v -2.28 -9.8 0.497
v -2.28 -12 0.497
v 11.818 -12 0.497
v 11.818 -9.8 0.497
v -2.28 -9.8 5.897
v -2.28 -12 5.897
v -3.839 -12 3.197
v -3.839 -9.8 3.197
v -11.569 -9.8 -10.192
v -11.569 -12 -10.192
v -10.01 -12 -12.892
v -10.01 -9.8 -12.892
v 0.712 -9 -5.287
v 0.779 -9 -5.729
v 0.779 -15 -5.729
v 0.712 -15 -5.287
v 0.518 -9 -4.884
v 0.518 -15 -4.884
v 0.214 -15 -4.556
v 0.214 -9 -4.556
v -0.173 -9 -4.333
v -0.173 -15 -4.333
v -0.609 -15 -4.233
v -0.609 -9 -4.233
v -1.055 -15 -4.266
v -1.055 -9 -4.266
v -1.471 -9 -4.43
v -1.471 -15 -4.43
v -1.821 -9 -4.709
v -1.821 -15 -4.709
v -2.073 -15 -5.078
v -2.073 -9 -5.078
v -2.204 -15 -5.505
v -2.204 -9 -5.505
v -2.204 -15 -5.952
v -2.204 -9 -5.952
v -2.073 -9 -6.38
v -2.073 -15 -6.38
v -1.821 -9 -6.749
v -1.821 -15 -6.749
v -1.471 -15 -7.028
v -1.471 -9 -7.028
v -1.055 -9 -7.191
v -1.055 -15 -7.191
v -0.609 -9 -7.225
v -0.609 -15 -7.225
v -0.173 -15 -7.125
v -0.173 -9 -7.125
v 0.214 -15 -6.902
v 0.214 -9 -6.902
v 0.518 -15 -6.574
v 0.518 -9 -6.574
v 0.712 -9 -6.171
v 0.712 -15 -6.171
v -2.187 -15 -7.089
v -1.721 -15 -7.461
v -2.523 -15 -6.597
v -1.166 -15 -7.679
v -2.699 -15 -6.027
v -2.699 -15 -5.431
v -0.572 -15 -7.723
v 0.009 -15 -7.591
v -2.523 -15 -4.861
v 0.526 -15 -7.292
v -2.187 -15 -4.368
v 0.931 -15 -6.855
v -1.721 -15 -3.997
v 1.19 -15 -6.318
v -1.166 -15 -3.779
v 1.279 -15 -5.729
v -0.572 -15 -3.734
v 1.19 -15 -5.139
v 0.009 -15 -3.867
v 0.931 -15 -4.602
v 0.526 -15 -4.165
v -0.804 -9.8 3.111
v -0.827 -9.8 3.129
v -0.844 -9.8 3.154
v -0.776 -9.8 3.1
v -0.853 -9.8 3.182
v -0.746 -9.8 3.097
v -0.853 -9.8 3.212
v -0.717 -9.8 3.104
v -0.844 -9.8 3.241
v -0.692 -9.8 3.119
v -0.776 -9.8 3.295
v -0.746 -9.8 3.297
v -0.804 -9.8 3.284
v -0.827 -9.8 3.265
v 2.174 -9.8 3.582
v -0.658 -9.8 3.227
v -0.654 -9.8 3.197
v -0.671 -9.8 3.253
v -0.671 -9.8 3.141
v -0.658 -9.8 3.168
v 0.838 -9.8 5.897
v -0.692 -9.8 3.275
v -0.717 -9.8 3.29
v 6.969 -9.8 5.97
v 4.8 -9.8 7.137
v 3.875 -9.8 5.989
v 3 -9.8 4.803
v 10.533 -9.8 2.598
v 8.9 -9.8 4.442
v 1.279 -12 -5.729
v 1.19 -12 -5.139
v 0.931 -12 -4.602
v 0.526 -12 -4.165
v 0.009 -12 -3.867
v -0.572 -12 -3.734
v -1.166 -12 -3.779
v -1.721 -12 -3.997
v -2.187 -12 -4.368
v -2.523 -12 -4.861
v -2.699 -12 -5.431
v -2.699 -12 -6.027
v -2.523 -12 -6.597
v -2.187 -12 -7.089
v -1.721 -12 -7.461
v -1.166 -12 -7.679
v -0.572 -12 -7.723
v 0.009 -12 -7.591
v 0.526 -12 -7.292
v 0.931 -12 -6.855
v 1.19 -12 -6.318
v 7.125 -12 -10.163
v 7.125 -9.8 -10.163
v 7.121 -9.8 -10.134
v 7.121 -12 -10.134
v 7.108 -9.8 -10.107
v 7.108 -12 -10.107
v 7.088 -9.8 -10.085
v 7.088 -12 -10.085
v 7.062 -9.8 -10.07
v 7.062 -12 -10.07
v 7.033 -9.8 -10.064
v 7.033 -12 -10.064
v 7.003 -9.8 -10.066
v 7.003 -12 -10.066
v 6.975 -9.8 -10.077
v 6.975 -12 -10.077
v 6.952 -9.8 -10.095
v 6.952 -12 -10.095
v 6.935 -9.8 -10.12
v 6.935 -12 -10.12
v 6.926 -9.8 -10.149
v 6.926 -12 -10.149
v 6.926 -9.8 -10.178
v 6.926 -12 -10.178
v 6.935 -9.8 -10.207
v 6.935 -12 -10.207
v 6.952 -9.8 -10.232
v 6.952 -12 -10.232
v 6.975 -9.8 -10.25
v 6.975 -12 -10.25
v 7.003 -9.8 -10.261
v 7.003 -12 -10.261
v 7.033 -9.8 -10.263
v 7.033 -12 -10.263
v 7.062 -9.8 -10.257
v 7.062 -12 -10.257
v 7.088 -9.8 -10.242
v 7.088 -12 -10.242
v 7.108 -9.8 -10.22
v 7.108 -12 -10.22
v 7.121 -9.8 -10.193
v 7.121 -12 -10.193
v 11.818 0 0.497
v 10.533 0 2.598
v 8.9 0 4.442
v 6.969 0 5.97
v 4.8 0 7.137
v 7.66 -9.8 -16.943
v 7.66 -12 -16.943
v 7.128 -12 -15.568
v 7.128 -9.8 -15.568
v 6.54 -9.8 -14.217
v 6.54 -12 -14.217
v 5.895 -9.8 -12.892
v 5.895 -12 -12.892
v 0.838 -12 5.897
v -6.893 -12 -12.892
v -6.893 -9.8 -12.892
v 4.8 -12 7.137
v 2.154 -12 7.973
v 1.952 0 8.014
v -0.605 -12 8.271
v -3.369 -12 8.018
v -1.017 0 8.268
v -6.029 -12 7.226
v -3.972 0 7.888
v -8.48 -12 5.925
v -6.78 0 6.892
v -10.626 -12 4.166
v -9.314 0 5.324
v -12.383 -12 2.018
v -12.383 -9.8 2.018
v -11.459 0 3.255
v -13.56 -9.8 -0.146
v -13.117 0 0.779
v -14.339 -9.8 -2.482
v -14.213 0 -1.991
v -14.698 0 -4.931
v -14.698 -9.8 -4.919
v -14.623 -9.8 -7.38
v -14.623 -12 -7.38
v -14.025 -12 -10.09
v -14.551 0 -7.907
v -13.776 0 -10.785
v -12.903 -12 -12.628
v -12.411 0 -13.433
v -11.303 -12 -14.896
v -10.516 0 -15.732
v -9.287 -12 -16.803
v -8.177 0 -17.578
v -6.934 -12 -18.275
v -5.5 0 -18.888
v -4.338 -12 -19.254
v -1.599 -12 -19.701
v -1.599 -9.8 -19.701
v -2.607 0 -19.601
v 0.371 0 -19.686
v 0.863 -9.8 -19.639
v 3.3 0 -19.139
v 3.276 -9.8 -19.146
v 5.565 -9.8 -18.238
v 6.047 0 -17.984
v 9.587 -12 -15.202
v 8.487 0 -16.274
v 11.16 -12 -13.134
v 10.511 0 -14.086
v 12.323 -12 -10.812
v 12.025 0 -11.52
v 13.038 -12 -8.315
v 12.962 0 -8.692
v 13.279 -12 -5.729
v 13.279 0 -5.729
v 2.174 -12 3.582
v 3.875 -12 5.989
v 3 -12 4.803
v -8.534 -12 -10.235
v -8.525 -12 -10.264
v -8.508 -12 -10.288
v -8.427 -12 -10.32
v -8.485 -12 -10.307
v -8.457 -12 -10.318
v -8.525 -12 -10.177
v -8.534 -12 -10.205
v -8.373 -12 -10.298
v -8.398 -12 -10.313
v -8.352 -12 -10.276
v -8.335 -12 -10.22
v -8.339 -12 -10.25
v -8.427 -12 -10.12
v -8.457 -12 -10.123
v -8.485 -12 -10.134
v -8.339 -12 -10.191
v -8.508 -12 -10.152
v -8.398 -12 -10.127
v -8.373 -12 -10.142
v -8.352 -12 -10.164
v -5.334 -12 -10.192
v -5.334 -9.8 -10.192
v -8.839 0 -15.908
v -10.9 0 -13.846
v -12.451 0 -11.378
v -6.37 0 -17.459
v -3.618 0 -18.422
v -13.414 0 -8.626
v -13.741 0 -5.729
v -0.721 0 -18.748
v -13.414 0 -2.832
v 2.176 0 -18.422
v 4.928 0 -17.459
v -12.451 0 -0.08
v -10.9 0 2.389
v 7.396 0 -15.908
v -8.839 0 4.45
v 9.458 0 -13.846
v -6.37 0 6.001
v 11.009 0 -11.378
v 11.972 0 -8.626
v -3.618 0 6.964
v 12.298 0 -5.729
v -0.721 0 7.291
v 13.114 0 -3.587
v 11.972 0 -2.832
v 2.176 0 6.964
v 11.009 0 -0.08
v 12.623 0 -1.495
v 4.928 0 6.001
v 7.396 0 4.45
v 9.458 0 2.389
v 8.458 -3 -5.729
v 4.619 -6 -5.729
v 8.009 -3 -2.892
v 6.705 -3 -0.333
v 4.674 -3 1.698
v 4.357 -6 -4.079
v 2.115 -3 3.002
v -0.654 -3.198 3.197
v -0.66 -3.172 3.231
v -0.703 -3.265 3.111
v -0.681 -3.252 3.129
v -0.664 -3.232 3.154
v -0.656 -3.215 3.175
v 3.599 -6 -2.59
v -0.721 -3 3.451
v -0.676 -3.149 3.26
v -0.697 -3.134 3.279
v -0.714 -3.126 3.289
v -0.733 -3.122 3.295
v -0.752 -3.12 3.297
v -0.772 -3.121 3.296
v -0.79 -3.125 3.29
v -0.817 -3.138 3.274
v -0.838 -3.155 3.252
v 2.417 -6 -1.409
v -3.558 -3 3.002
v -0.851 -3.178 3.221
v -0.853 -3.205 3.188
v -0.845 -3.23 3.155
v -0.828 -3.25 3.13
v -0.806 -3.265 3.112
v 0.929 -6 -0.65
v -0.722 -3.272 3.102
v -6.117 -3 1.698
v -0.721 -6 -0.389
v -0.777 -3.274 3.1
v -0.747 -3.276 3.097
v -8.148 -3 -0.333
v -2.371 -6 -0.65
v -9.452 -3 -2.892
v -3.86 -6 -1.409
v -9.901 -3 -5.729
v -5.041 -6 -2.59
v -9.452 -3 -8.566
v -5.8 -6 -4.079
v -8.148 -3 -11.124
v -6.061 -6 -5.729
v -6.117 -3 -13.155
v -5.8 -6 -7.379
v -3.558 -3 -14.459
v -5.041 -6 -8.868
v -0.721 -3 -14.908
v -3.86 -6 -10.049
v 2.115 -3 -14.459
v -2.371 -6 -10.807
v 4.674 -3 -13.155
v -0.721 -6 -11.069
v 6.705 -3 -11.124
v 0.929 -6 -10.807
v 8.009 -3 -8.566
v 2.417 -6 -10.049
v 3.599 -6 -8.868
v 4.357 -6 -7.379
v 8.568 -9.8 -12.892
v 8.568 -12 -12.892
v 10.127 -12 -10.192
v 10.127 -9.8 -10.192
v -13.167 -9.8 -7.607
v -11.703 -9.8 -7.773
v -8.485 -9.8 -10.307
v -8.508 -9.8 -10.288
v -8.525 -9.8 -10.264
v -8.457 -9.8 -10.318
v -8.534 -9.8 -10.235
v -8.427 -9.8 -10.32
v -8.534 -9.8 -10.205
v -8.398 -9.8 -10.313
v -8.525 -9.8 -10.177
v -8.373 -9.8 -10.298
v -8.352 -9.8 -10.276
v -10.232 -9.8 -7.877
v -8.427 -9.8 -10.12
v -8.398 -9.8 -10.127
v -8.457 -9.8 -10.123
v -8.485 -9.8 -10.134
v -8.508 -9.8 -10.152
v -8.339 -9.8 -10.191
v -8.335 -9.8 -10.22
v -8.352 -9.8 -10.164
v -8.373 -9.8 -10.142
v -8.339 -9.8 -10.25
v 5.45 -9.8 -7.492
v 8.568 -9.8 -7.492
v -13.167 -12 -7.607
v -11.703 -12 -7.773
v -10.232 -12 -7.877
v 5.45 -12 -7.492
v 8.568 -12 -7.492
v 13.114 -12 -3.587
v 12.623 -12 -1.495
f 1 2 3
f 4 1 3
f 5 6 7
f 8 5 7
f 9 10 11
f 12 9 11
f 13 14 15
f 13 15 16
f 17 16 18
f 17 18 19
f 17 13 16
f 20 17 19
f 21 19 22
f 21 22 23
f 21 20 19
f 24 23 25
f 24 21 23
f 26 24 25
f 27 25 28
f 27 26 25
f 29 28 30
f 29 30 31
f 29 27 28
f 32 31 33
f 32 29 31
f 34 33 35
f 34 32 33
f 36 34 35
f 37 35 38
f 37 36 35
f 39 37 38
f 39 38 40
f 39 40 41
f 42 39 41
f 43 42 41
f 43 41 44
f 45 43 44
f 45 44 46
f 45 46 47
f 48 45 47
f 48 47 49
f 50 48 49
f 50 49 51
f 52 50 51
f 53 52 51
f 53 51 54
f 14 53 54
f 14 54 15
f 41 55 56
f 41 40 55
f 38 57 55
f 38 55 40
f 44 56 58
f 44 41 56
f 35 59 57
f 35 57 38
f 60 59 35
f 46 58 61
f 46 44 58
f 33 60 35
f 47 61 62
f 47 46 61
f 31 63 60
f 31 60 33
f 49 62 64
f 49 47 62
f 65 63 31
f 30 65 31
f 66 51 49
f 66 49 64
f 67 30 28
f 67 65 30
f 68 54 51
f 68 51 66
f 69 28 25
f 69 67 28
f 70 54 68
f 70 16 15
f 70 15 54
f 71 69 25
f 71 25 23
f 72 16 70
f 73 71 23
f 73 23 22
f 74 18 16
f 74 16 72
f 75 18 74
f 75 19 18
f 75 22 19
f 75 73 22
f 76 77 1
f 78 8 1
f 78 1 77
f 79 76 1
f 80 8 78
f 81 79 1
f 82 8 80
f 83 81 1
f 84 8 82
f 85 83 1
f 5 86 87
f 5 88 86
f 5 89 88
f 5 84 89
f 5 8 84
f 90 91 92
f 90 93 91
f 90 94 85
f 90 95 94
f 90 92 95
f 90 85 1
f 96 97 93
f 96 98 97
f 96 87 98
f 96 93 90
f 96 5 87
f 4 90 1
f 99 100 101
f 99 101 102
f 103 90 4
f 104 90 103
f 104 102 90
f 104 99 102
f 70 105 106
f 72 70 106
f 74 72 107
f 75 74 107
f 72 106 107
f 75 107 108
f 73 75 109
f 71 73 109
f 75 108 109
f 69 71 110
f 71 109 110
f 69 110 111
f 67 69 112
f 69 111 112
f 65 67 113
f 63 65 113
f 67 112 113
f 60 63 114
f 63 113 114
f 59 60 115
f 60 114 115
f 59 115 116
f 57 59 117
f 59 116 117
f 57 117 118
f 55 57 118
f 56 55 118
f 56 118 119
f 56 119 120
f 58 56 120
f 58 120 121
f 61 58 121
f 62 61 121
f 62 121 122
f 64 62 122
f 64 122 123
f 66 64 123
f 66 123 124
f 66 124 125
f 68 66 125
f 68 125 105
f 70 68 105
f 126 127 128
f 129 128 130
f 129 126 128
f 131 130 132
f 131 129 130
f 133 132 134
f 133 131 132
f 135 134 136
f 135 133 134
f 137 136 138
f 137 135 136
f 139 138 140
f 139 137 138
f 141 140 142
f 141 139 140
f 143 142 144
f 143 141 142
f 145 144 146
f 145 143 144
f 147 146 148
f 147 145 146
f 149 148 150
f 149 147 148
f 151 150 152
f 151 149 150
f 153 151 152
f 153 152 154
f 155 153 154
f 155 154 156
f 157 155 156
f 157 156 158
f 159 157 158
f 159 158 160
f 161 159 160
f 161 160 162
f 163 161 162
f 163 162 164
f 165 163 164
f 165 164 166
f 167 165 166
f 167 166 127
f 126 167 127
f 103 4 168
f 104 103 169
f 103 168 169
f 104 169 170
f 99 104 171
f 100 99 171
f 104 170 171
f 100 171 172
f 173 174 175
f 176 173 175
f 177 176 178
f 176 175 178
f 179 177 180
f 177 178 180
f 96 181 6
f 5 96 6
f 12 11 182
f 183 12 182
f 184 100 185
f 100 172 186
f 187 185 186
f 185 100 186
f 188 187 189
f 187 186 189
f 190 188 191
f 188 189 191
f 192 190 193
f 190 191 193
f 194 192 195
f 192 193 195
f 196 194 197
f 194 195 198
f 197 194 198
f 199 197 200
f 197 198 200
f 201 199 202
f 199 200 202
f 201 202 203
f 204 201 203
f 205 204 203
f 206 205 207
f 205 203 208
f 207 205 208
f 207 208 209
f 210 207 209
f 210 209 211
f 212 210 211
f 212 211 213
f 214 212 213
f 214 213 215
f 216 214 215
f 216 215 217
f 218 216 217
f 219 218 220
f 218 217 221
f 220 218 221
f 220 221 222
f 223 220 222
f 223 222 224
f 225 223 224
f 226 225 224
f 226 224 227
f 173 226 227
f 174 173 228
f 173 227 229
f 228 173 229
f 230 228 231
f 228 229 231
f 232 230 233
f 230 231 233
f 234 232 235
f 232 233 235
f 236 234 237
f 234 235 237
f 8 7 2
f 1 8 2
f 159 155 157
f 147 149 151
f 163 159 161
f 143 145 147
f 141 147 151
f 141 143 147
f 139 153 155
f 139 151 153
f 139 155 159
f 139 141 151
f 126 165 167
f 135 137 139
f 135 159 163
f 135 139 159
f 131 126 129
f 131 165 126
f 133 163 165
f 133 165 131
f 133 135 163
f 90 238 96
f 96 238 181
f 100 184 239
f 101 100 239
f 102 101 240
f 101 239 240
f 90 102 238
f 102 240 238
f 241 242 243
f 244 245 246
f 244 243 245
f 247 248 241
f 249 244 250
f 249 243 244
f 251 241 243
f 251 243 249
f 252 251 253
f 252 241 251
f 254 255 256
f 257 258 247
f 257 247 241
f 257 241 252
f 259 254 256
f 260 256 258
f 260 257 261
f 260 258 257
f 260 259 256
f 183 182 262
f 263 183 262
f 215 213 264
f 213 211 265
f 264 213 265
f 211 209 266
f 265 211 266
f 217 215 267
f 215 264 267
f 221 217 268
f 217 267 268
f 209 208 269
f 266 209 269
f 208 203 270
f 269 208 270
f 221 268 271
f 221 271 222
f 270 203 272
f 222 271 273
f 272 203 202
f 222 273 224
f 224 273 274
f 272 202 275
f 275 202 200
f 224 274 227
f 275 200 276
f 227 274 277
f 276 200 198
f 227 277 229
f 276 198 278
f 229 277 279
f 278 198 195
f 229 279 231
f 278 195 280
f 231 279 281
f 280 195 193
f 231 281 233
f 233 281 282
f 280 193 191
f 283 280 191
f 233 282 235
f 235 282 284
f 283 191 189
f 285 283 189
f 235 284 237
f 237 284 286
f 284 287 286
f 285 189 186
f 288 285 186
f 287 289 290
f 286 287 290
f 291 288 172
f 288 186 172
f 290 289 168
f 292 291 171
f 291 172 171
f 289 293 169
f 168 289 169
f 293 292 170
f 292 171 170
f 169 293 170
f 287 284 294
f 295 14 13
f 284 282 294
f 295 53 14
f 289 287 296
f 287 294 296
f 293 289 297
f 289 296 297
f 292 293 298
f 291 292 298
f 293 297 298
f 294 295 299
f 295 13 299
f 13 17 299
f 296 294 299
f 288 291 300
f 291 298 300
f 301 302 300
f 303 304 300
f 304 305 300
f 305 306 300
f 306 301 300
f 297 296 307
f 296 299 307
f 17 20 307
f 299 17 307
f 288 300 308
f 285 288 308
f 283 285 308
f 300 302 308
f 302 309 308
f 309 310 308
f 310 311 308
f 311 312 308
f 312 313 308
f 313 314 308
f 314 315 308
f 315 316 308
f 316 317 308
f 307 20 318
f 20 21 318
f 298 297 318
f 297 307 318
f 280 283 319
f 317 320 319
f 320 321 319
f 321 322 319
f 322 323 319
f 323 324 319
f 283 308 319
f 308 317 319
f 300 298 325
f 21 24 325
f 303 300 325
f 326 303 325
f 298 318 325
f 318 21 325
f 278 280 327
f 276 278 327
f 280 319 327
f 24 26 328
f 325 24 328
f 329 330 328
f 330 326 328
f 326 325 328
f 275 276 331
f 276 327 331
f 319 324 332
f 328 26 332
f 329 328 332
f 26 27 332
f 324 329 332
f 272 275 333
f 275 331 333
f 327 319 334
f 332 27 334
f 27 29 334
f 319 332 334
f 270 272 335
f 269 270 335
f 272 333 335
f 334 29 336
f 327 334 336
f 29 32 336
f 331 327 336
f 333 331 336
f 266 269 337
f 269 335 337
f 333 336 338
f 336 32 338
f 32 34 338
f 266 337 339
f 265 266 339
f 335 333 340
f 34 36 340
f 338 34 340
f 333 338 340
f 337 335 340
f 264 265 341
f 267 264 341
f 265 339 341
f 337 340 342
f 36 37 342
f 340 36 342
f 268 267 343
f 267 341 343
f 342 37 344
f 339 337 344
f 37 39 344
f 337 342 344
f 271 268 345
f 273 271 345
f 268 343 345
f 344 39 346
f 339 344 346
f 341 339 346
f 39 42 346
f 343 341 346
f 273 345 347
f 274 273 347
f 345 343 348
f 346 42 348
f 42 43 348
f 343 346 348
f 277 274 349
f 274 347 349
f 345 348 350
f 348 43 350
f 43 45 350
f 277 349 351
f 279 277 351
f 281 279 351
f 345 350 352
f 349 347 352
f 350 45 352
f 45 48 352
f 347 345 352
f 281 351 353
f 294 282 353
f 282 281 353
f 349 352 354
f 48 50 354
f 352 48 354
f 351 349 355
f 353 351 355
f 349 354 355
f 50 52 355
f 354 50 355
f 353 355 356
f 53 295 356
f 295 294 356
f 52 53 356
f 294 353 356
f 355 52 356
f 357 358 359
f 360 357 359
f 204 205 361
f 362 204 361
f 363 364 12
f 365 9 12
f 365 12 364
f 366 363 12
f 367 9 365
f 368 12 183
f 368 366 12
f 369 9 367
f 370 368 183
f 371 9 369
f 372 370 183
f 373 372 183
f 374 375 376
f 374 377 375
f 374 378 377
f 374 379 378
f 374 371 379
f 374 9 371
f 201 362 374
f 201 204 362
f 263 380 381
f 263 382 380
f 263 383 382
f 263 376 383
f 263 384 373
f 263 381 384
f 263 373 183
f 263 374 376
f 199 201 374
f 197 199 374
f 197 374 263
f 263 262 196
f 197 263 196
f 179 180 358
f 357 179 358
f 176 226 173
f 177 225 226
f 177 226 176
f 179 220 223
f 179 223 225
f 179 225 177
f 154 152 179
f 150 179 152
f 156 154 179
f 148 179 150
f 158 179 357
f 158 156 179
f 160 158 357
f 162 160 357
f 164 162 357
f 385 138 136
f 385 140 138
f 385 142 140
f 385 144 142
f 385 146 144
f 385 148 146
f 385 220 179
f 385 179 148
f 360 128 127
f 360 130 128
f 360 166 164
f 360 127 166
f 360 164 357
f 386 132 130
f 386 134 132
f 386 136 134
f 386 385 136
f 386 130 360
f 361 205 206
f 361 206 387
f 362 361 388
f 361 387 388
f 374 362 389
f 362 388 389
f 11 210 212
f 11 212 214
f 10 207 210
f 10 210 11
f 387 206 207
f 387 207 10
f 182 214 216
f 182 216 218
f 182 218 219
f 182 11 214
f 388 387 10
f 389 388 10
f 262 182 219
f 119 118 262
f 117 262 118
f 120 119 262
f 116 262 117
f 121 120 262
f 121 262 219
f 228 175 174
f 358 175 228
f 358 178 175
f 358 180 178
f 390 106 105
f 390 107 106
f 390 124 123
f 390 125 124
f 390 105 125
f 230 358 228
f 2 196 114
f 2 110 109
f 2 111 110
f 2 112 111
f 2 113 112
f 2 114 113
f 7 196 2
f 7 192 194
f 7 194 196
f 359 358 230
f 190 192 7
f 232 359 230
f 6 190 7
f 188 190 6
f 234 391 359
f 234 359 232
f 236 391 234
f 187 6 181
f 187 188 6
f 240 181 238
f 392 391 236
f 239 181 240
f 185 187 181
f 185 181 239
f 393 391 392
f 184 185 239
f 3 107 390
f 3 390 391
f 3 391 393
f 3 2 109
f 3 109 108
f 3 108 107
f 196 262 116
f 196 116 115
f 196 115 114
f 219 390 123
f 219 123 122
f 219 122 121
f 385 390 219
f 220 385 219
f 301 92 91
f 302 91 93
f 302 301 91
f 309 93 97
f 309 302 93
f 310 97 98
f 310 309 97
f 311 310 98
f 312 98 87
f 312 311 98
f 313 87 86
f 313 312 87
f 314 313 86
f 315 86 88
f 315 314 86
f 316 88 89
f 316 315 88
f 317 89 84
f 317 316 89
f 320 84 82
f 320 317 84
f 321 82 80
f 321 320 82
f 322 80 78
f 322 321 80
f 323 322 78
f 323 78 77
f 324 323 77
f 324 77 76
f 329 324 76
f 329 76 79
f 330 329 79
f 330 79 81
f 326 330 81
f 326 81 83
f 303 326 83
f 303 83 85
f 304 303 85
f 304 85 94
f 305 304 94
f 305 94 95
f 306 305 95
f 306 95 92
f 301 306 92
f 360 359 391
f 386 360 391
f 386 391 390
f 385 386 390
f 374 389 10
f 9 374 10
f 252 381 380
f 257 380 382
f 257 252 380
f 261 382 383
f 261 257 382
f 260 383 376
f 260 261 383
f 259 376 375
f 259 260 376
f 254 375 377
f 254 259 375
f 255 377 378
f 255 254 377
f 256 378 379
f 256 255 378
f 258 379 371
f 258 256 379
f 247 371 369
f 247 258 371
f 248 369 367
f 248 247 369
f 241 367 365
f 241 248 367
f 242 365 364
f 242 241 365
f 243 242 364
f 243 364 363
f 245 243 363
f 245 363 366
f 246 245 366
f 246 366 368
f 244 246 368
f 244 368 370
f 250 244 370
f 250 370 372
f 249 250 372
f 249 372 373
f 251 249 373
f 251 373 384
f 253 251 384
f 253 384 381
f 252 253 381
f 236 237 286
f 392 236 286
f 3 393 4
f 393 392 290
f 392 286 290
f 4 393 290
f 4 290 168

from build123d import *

# Parameters (mm, degrees)
F0_R      = 2
F0_R_2    = 0.1
F1_DEPTH  = 12
F0_R_3    = 1.5
F2_DEPTH  = 15
F4_R      = 0.1
F5_DEPTH  = 2
F6_COUNT  = 3
F5_FACE_R = 0.1
F6_FACE_R = 0.1
F7_DEPTH  = 4.2


# Not quite as in the source:
# - a fillet or chamfer that OpenCascade refuses, or shapes differently, is made with other operations: its cross-section is extruded or revolved along the edge and cut away or added


with BuildPart() as f1:
    # F0 (on Front) → F1 (new body)
    with BuildSketch(Plane.XZ):
        with BuildLine():
            ThreePointArc((4.7997142496, 7.1366126269), (-12.410762485, -13.4329699503), (13.278817402, -5.728833265))
            ThreePointArc((13.278817402, -5.728833265), (12.9087772386, -2.5313037732), (11.8182181375, 0.4971950993))
            Line((11.8182181375, 0.4971950993), (-2.2800283653, 0.4971950993))
            Line((-2.2800283653, 0.4971950993), (-3.8388741325, 3.1971951693))
            Line((-3.8388741325, 3.1971951693), (-2.2800283653, 5.8971952394))
            Line((-2.2800283653, 5.8971952394), (0.8376631692, 5.8971952394))
            Line((0.8376631692, 5.8971952394), (2.174251278, 3.5821567261))
            ThreePointArc((2.174251278, 3.5821567261), (3.4311500139, 5.4006249736), (4.7997142496, 7.1366126269))
        make_face()
        with Locations((-0.721182598, -5.728833265)):
            Circle(F0_R, mode=Mode.SUBTRACT)
        with BuildLine():
            Line((-2.2800283653, 0.4971950993), (11.8182181375, 0.4971950993))
            ThreePointArc((11.8182181375, 0.4971950993), (8.8998388381, 4.4415131659), (4.7997142496, 7.1366126269))
            ThreePointArc((4.7997142496, 7.1366126269), (3.4311500139, 5.4006249736), (2.174251278, 3.5821567261))
            Line((2.174251278, 3.5821567261), (0.8376631692, 5.8971952394))
            Line((0.8376631692, 5.8971952394), (-2.2800283653, 5.8971952394))
            Line((-2.2800283653, 5.8971952394), (-3.8388741325, 3.1971951693))
            Line((-3.8388741325, 3.1971951693), (-2.2800283653, 0.4971950993))
        make_face()
        with Locations((-0.7538866513, 3.197135257)):
            Circle(F0_R_2, mode=Mode.SUBTRACT)
    extrude(amount=F1_DEPTH)

    # F0 (on Front) → F2 (join)
    with BuildSketch(Plane.XZ):
        with Locations((-0.721182598, -5.728833265)):
            Circle(F0_R)
        with Locations((-0.721182598, -5.728833265)):
            Circle(F0_R_3, mode=Mode.SUBTRACT)
    extrude(amount=F2_DEPTH)

    # F3: chamfer of 9 x 11.5194746897 on 1 edges, made by hand

    # F3_s1 → F3_t2 (revolve, cut)
    with BuildSketch(Plane.XY.offset(-5.728833265)):
        Polygon((12.2982920917, 0), (0.778817402, -9), (0.778817402, 0), align=None)
    revolve(axis=Axis((-0.721182598, 0, -5.728833265), (0, -1, 0)), mode=Mode.SUBTRACT)

    # F6: F5 ×3 about axis
    f6_axis = Axis((-0.721182598, 0, -5.728833265), (0, -1, 0))


with BuildPart() as f5:
    # F4 (on face) → F5 (new body)
    with BuildSketch(Plane.XZ.offset(12)):
        with BuildLine():
            Line((-2.2800283653, 0.4971950993), (11.8182181375, 0.4971950993))
            ThreePointArc((11.8182181375, 0.4971950993), (8.8998388381, 4.4415131659), (4.7997142496, 7.1366126269))
            ThreePointArc((4.7997142496, 7.1366126269), (3.4311500139, 5.4006249736), (2.174251278, 3.5821567261))
            Line((2.174251278, 3.5821567261), (0.8376631692, 5.8971952394))
            Line((0.8376631692, 5.8971952394), (-2.2800283653, 5.8971952394))
            Line((-2.2800283653, 5.8971952394), (-3.8388741325, 3.1971951693))
            Line((-3.8388741325, 3.1971951693), (-2.2800283653, 0.4971950993))
        make_face()
        with Locations((-0.7538866513, 3.197135257)):
            Circle(F4_R, mode=Mode.SUBTRACT)
    extrude(amount=F5_DEPTH)


with BuildPart() as f1_1:
    add(f1.part)
    for i in range(1, F6_COUNT):
        add(f5.part.rotate(f6_axis, i * 360 / F6_COUNT))


with BuildPart() as f7_tool:
    # F5_face (on face) + F6_face (on face) → F7 (new body)
    with BuildSketch(Plane(origin=(3.5829132763, -14, 3.0354703716), x_dir=(1, 0, 0), z_dir=(0, -1, 0))):
        with BuildLine():
            Line((-5.8629416416, 2.8617248677), (-7.4217874088, 0.1617247977))
            Line((-7.4217874088, 0.1617247977), (-5.8629416416, -2.5382752723))
            Line((-5.8629416416, -2.5382752723), (8.2353048612, -2.5382752723))
            ThreePointArc((8.2353048612, -2.5382752723), (5.3169255618, 1.4060427943), (1.2168009733, 4.1011422553))
            ThreePointArc((1.2168009733, 4.1011422553), (-0.1517632624, 2.365154602), (-1.4086619983, 0.5466863545))
            Line((-1.4086619983, 0.5466863545), (-2.7452501071, 2.8617248677))
            Line((-2.7452501071, 2.8617248677), (-5.8629416416, 2.8617248677))
        make_face()
        with Locations((-4.3367999276, 0.1616648853)):
            Circle(F5_FACE_R, mode=Mode.SUBTRACT)
    with BuildSketch(Plane(origin=(4.7168790606, -14, -13.8384414508), x_dir=(1, 0, 0), z_dir=(0, -1, 0))):
        with BuildLine():
            Line((5.4097972549, 3.6465939687), (3.8509514876, 6.3465940387))
            Line((3.8509514876, 6.3465940387), (0.7332599531, 6.3465940387))
            Line((0.7332599531, 6.3465940387), (-6.3158632983, -5.8628455816))
            ThreePointArc((-6.3158632983, -5.8628455816), (-1.4407940022, -5.3076140037), (2.943292891, -3.1043516819))
            ThreePointArc((2.943292891, -3.1043516819), (2.1241656004, -1.0511464604), (1.17777527, 0.9465938986))
            Line((1.17777527, 0.9465938986), (3.8509514876, 0.9465938986))
            Line((3.8509514876, 0.9465938986), (5.4097972549, 3.6465939687))
        make_face()
        with Locations((2.3084058614, 3.6749464658)):
            Circle(F6_FACE_R, mode=Mode.SUBTRACT)
        with BuildLine():
            Line((-14.7270748049, 0.9465938986), (-11.6093832704, 0.9465938986))
            Line((-11.6093832704, 0.9465938986), (-10.0505375032, 3.6465939687))
            Line((-10.0505375032, 3.6465939687), (-17.0996607546, 15.8560335889))
            ThreePointArc((-17.0996607546, 15.8560335889), (-19.0563507512, 11.3564839444), (-19.3403130559, 6.4581221616))
            ThreePointArc((-19.3403130559, 6.4581221616), (-17.1526215296, 6.1409045934), (-14.9493324633, 5.9616324819))
            Line((-14.9493324633, 5.9616324819), (-16.2859205721, 3.6465939687))
            Line((-16.2859205721, 3.6465939687), (-14.7270748049, 0.9465938986))
        make_face()
        with Locations((-13.1518251254, 3.6183013839)):
            Circle(F6_FACE_R, mode=Mode.SUBTRACT)
    extrude(amount=-F7_DEPTH)


with BuildPart() as f1_2:
    add(f1_1.part)

    # F7: cut by f7_tool
    add(f7_tool.part, mode=Mode.SUBTRACT)


with BuildPart() as f5_1:
    add(f5.part)

    # F7: cut by f7_tool
    add(f7_tool.part, mode=Mode.SUBTRACT)


solid = f1_2.part
